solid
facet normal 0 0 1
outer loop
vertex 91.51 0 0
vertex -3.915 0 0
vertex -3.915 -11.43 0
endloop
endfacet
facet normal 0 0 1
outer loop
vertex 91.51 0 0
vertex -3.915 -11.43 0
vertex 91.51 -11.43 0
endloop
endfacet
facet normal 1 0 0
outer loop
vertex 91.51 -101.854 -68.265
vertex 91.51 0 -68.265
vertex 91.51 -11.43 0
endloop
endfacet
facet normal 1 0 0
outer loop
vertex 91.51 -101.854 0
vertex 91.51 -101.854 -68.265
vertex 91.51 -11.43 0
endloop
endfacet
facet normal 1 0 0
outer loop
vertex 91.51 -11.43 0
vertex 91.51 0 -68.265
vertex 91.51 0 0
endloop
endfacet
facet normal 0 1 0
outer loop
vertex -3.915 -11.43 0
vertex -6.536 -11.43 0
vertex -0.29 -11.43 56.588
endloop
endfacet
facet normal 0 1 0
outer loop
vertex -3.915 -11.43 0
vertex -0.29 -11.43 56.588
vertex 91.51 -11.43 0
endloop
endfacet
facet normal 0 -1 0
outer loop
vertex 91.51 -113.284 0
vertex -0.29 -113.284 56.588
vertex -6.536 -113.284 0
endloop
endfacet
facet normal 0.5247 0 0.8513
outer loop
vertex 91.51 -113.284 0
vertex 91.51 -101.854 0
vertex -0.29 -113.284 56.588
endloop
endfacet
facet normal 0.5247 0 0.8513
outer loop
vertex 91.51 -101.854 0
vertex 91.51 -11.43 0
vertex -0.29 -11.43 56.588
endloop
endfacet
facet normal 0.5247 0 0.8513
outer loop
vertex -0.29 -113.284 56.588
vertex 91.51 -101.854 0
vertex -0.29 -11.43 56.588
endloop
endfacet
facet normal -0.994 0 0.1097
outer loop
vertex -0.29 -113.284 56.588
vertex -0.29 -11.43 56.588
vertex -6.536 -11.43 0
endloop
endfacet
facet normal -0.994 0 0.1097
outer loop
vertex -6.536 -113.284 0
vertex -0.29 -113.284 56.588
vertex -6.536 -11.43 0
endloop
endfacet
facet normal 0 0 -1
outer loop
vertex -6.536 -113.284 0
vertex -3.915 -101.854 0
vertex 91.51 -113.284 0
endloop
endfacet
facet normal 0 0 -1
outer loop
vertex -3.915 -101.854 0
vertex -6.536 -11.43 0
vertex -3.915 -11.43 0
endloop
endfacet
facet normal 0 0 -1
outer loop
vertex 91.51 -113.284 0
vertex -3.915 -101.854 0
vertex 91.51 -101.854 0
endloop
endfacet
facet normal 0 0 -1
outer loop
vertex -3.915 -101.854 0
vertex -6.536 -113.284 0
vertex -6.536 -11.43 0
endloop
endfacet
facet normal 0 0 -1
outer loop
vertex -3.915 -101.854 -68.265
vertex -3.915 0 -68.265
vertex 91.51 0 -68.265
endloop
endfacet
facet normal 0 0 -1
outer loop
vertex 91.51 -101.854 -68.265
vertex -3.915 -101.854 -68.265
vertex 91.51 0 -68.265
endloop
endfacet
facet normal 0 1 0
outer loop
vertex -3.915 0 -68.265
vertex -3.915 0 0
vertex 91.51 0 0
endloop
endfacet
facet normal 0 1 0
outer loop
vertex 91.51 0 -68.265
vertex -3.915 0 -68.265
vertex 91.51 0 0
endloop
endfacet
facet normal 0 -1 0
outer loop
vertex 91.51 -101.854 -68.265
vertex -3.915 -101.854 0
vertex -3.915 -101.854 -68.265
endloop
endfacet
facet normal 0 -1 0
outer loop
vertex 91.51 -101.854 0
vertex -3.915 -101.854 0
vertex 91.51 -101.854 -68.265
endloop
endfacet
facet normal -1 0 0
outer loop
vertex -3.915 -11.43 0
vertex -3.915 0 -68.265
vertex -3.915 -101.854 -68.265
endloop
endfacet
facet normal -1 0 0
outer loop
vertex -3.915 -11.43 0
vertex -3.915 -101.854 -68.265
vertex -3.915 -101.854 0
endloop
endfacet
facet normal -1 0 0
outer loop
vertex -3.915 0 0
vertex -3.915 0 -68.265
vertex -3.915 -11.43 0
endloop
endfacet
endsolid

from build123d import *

# Parameters (mm, degrees)
F0_W          = 95.4247708432
F0_H          = 68.2654082775
F1_DEPTH      = 101.854
F3_DEPTH      = 90.424
F3_DEPTH_BACK = 11.43


with BuildPart() as f1:
    # F0 (on Front) → F1 (new body)
    with BuildSketch(Plane.XZ):
        with Locations((43.7975230161, -34.1327041388)):
            Rectangle(F0_W, F0_H)
    extrude(amount=F1_DEPTH)

    # F2 (on face) → F3 (join, two sides)
    with BuildSketch(Plane.XZ.offset(101.854)) as f3_sk:
        Polygon((-0.2897456373, 56.5875391827), (-6.536422763, 0), (91.5099084377, 0), align=None)
    extrude(amount=-F3_DEPTH)
    extrude(f3_sk.sketch, amount=F3_DEPTH_BACK)


solid = f1.part
